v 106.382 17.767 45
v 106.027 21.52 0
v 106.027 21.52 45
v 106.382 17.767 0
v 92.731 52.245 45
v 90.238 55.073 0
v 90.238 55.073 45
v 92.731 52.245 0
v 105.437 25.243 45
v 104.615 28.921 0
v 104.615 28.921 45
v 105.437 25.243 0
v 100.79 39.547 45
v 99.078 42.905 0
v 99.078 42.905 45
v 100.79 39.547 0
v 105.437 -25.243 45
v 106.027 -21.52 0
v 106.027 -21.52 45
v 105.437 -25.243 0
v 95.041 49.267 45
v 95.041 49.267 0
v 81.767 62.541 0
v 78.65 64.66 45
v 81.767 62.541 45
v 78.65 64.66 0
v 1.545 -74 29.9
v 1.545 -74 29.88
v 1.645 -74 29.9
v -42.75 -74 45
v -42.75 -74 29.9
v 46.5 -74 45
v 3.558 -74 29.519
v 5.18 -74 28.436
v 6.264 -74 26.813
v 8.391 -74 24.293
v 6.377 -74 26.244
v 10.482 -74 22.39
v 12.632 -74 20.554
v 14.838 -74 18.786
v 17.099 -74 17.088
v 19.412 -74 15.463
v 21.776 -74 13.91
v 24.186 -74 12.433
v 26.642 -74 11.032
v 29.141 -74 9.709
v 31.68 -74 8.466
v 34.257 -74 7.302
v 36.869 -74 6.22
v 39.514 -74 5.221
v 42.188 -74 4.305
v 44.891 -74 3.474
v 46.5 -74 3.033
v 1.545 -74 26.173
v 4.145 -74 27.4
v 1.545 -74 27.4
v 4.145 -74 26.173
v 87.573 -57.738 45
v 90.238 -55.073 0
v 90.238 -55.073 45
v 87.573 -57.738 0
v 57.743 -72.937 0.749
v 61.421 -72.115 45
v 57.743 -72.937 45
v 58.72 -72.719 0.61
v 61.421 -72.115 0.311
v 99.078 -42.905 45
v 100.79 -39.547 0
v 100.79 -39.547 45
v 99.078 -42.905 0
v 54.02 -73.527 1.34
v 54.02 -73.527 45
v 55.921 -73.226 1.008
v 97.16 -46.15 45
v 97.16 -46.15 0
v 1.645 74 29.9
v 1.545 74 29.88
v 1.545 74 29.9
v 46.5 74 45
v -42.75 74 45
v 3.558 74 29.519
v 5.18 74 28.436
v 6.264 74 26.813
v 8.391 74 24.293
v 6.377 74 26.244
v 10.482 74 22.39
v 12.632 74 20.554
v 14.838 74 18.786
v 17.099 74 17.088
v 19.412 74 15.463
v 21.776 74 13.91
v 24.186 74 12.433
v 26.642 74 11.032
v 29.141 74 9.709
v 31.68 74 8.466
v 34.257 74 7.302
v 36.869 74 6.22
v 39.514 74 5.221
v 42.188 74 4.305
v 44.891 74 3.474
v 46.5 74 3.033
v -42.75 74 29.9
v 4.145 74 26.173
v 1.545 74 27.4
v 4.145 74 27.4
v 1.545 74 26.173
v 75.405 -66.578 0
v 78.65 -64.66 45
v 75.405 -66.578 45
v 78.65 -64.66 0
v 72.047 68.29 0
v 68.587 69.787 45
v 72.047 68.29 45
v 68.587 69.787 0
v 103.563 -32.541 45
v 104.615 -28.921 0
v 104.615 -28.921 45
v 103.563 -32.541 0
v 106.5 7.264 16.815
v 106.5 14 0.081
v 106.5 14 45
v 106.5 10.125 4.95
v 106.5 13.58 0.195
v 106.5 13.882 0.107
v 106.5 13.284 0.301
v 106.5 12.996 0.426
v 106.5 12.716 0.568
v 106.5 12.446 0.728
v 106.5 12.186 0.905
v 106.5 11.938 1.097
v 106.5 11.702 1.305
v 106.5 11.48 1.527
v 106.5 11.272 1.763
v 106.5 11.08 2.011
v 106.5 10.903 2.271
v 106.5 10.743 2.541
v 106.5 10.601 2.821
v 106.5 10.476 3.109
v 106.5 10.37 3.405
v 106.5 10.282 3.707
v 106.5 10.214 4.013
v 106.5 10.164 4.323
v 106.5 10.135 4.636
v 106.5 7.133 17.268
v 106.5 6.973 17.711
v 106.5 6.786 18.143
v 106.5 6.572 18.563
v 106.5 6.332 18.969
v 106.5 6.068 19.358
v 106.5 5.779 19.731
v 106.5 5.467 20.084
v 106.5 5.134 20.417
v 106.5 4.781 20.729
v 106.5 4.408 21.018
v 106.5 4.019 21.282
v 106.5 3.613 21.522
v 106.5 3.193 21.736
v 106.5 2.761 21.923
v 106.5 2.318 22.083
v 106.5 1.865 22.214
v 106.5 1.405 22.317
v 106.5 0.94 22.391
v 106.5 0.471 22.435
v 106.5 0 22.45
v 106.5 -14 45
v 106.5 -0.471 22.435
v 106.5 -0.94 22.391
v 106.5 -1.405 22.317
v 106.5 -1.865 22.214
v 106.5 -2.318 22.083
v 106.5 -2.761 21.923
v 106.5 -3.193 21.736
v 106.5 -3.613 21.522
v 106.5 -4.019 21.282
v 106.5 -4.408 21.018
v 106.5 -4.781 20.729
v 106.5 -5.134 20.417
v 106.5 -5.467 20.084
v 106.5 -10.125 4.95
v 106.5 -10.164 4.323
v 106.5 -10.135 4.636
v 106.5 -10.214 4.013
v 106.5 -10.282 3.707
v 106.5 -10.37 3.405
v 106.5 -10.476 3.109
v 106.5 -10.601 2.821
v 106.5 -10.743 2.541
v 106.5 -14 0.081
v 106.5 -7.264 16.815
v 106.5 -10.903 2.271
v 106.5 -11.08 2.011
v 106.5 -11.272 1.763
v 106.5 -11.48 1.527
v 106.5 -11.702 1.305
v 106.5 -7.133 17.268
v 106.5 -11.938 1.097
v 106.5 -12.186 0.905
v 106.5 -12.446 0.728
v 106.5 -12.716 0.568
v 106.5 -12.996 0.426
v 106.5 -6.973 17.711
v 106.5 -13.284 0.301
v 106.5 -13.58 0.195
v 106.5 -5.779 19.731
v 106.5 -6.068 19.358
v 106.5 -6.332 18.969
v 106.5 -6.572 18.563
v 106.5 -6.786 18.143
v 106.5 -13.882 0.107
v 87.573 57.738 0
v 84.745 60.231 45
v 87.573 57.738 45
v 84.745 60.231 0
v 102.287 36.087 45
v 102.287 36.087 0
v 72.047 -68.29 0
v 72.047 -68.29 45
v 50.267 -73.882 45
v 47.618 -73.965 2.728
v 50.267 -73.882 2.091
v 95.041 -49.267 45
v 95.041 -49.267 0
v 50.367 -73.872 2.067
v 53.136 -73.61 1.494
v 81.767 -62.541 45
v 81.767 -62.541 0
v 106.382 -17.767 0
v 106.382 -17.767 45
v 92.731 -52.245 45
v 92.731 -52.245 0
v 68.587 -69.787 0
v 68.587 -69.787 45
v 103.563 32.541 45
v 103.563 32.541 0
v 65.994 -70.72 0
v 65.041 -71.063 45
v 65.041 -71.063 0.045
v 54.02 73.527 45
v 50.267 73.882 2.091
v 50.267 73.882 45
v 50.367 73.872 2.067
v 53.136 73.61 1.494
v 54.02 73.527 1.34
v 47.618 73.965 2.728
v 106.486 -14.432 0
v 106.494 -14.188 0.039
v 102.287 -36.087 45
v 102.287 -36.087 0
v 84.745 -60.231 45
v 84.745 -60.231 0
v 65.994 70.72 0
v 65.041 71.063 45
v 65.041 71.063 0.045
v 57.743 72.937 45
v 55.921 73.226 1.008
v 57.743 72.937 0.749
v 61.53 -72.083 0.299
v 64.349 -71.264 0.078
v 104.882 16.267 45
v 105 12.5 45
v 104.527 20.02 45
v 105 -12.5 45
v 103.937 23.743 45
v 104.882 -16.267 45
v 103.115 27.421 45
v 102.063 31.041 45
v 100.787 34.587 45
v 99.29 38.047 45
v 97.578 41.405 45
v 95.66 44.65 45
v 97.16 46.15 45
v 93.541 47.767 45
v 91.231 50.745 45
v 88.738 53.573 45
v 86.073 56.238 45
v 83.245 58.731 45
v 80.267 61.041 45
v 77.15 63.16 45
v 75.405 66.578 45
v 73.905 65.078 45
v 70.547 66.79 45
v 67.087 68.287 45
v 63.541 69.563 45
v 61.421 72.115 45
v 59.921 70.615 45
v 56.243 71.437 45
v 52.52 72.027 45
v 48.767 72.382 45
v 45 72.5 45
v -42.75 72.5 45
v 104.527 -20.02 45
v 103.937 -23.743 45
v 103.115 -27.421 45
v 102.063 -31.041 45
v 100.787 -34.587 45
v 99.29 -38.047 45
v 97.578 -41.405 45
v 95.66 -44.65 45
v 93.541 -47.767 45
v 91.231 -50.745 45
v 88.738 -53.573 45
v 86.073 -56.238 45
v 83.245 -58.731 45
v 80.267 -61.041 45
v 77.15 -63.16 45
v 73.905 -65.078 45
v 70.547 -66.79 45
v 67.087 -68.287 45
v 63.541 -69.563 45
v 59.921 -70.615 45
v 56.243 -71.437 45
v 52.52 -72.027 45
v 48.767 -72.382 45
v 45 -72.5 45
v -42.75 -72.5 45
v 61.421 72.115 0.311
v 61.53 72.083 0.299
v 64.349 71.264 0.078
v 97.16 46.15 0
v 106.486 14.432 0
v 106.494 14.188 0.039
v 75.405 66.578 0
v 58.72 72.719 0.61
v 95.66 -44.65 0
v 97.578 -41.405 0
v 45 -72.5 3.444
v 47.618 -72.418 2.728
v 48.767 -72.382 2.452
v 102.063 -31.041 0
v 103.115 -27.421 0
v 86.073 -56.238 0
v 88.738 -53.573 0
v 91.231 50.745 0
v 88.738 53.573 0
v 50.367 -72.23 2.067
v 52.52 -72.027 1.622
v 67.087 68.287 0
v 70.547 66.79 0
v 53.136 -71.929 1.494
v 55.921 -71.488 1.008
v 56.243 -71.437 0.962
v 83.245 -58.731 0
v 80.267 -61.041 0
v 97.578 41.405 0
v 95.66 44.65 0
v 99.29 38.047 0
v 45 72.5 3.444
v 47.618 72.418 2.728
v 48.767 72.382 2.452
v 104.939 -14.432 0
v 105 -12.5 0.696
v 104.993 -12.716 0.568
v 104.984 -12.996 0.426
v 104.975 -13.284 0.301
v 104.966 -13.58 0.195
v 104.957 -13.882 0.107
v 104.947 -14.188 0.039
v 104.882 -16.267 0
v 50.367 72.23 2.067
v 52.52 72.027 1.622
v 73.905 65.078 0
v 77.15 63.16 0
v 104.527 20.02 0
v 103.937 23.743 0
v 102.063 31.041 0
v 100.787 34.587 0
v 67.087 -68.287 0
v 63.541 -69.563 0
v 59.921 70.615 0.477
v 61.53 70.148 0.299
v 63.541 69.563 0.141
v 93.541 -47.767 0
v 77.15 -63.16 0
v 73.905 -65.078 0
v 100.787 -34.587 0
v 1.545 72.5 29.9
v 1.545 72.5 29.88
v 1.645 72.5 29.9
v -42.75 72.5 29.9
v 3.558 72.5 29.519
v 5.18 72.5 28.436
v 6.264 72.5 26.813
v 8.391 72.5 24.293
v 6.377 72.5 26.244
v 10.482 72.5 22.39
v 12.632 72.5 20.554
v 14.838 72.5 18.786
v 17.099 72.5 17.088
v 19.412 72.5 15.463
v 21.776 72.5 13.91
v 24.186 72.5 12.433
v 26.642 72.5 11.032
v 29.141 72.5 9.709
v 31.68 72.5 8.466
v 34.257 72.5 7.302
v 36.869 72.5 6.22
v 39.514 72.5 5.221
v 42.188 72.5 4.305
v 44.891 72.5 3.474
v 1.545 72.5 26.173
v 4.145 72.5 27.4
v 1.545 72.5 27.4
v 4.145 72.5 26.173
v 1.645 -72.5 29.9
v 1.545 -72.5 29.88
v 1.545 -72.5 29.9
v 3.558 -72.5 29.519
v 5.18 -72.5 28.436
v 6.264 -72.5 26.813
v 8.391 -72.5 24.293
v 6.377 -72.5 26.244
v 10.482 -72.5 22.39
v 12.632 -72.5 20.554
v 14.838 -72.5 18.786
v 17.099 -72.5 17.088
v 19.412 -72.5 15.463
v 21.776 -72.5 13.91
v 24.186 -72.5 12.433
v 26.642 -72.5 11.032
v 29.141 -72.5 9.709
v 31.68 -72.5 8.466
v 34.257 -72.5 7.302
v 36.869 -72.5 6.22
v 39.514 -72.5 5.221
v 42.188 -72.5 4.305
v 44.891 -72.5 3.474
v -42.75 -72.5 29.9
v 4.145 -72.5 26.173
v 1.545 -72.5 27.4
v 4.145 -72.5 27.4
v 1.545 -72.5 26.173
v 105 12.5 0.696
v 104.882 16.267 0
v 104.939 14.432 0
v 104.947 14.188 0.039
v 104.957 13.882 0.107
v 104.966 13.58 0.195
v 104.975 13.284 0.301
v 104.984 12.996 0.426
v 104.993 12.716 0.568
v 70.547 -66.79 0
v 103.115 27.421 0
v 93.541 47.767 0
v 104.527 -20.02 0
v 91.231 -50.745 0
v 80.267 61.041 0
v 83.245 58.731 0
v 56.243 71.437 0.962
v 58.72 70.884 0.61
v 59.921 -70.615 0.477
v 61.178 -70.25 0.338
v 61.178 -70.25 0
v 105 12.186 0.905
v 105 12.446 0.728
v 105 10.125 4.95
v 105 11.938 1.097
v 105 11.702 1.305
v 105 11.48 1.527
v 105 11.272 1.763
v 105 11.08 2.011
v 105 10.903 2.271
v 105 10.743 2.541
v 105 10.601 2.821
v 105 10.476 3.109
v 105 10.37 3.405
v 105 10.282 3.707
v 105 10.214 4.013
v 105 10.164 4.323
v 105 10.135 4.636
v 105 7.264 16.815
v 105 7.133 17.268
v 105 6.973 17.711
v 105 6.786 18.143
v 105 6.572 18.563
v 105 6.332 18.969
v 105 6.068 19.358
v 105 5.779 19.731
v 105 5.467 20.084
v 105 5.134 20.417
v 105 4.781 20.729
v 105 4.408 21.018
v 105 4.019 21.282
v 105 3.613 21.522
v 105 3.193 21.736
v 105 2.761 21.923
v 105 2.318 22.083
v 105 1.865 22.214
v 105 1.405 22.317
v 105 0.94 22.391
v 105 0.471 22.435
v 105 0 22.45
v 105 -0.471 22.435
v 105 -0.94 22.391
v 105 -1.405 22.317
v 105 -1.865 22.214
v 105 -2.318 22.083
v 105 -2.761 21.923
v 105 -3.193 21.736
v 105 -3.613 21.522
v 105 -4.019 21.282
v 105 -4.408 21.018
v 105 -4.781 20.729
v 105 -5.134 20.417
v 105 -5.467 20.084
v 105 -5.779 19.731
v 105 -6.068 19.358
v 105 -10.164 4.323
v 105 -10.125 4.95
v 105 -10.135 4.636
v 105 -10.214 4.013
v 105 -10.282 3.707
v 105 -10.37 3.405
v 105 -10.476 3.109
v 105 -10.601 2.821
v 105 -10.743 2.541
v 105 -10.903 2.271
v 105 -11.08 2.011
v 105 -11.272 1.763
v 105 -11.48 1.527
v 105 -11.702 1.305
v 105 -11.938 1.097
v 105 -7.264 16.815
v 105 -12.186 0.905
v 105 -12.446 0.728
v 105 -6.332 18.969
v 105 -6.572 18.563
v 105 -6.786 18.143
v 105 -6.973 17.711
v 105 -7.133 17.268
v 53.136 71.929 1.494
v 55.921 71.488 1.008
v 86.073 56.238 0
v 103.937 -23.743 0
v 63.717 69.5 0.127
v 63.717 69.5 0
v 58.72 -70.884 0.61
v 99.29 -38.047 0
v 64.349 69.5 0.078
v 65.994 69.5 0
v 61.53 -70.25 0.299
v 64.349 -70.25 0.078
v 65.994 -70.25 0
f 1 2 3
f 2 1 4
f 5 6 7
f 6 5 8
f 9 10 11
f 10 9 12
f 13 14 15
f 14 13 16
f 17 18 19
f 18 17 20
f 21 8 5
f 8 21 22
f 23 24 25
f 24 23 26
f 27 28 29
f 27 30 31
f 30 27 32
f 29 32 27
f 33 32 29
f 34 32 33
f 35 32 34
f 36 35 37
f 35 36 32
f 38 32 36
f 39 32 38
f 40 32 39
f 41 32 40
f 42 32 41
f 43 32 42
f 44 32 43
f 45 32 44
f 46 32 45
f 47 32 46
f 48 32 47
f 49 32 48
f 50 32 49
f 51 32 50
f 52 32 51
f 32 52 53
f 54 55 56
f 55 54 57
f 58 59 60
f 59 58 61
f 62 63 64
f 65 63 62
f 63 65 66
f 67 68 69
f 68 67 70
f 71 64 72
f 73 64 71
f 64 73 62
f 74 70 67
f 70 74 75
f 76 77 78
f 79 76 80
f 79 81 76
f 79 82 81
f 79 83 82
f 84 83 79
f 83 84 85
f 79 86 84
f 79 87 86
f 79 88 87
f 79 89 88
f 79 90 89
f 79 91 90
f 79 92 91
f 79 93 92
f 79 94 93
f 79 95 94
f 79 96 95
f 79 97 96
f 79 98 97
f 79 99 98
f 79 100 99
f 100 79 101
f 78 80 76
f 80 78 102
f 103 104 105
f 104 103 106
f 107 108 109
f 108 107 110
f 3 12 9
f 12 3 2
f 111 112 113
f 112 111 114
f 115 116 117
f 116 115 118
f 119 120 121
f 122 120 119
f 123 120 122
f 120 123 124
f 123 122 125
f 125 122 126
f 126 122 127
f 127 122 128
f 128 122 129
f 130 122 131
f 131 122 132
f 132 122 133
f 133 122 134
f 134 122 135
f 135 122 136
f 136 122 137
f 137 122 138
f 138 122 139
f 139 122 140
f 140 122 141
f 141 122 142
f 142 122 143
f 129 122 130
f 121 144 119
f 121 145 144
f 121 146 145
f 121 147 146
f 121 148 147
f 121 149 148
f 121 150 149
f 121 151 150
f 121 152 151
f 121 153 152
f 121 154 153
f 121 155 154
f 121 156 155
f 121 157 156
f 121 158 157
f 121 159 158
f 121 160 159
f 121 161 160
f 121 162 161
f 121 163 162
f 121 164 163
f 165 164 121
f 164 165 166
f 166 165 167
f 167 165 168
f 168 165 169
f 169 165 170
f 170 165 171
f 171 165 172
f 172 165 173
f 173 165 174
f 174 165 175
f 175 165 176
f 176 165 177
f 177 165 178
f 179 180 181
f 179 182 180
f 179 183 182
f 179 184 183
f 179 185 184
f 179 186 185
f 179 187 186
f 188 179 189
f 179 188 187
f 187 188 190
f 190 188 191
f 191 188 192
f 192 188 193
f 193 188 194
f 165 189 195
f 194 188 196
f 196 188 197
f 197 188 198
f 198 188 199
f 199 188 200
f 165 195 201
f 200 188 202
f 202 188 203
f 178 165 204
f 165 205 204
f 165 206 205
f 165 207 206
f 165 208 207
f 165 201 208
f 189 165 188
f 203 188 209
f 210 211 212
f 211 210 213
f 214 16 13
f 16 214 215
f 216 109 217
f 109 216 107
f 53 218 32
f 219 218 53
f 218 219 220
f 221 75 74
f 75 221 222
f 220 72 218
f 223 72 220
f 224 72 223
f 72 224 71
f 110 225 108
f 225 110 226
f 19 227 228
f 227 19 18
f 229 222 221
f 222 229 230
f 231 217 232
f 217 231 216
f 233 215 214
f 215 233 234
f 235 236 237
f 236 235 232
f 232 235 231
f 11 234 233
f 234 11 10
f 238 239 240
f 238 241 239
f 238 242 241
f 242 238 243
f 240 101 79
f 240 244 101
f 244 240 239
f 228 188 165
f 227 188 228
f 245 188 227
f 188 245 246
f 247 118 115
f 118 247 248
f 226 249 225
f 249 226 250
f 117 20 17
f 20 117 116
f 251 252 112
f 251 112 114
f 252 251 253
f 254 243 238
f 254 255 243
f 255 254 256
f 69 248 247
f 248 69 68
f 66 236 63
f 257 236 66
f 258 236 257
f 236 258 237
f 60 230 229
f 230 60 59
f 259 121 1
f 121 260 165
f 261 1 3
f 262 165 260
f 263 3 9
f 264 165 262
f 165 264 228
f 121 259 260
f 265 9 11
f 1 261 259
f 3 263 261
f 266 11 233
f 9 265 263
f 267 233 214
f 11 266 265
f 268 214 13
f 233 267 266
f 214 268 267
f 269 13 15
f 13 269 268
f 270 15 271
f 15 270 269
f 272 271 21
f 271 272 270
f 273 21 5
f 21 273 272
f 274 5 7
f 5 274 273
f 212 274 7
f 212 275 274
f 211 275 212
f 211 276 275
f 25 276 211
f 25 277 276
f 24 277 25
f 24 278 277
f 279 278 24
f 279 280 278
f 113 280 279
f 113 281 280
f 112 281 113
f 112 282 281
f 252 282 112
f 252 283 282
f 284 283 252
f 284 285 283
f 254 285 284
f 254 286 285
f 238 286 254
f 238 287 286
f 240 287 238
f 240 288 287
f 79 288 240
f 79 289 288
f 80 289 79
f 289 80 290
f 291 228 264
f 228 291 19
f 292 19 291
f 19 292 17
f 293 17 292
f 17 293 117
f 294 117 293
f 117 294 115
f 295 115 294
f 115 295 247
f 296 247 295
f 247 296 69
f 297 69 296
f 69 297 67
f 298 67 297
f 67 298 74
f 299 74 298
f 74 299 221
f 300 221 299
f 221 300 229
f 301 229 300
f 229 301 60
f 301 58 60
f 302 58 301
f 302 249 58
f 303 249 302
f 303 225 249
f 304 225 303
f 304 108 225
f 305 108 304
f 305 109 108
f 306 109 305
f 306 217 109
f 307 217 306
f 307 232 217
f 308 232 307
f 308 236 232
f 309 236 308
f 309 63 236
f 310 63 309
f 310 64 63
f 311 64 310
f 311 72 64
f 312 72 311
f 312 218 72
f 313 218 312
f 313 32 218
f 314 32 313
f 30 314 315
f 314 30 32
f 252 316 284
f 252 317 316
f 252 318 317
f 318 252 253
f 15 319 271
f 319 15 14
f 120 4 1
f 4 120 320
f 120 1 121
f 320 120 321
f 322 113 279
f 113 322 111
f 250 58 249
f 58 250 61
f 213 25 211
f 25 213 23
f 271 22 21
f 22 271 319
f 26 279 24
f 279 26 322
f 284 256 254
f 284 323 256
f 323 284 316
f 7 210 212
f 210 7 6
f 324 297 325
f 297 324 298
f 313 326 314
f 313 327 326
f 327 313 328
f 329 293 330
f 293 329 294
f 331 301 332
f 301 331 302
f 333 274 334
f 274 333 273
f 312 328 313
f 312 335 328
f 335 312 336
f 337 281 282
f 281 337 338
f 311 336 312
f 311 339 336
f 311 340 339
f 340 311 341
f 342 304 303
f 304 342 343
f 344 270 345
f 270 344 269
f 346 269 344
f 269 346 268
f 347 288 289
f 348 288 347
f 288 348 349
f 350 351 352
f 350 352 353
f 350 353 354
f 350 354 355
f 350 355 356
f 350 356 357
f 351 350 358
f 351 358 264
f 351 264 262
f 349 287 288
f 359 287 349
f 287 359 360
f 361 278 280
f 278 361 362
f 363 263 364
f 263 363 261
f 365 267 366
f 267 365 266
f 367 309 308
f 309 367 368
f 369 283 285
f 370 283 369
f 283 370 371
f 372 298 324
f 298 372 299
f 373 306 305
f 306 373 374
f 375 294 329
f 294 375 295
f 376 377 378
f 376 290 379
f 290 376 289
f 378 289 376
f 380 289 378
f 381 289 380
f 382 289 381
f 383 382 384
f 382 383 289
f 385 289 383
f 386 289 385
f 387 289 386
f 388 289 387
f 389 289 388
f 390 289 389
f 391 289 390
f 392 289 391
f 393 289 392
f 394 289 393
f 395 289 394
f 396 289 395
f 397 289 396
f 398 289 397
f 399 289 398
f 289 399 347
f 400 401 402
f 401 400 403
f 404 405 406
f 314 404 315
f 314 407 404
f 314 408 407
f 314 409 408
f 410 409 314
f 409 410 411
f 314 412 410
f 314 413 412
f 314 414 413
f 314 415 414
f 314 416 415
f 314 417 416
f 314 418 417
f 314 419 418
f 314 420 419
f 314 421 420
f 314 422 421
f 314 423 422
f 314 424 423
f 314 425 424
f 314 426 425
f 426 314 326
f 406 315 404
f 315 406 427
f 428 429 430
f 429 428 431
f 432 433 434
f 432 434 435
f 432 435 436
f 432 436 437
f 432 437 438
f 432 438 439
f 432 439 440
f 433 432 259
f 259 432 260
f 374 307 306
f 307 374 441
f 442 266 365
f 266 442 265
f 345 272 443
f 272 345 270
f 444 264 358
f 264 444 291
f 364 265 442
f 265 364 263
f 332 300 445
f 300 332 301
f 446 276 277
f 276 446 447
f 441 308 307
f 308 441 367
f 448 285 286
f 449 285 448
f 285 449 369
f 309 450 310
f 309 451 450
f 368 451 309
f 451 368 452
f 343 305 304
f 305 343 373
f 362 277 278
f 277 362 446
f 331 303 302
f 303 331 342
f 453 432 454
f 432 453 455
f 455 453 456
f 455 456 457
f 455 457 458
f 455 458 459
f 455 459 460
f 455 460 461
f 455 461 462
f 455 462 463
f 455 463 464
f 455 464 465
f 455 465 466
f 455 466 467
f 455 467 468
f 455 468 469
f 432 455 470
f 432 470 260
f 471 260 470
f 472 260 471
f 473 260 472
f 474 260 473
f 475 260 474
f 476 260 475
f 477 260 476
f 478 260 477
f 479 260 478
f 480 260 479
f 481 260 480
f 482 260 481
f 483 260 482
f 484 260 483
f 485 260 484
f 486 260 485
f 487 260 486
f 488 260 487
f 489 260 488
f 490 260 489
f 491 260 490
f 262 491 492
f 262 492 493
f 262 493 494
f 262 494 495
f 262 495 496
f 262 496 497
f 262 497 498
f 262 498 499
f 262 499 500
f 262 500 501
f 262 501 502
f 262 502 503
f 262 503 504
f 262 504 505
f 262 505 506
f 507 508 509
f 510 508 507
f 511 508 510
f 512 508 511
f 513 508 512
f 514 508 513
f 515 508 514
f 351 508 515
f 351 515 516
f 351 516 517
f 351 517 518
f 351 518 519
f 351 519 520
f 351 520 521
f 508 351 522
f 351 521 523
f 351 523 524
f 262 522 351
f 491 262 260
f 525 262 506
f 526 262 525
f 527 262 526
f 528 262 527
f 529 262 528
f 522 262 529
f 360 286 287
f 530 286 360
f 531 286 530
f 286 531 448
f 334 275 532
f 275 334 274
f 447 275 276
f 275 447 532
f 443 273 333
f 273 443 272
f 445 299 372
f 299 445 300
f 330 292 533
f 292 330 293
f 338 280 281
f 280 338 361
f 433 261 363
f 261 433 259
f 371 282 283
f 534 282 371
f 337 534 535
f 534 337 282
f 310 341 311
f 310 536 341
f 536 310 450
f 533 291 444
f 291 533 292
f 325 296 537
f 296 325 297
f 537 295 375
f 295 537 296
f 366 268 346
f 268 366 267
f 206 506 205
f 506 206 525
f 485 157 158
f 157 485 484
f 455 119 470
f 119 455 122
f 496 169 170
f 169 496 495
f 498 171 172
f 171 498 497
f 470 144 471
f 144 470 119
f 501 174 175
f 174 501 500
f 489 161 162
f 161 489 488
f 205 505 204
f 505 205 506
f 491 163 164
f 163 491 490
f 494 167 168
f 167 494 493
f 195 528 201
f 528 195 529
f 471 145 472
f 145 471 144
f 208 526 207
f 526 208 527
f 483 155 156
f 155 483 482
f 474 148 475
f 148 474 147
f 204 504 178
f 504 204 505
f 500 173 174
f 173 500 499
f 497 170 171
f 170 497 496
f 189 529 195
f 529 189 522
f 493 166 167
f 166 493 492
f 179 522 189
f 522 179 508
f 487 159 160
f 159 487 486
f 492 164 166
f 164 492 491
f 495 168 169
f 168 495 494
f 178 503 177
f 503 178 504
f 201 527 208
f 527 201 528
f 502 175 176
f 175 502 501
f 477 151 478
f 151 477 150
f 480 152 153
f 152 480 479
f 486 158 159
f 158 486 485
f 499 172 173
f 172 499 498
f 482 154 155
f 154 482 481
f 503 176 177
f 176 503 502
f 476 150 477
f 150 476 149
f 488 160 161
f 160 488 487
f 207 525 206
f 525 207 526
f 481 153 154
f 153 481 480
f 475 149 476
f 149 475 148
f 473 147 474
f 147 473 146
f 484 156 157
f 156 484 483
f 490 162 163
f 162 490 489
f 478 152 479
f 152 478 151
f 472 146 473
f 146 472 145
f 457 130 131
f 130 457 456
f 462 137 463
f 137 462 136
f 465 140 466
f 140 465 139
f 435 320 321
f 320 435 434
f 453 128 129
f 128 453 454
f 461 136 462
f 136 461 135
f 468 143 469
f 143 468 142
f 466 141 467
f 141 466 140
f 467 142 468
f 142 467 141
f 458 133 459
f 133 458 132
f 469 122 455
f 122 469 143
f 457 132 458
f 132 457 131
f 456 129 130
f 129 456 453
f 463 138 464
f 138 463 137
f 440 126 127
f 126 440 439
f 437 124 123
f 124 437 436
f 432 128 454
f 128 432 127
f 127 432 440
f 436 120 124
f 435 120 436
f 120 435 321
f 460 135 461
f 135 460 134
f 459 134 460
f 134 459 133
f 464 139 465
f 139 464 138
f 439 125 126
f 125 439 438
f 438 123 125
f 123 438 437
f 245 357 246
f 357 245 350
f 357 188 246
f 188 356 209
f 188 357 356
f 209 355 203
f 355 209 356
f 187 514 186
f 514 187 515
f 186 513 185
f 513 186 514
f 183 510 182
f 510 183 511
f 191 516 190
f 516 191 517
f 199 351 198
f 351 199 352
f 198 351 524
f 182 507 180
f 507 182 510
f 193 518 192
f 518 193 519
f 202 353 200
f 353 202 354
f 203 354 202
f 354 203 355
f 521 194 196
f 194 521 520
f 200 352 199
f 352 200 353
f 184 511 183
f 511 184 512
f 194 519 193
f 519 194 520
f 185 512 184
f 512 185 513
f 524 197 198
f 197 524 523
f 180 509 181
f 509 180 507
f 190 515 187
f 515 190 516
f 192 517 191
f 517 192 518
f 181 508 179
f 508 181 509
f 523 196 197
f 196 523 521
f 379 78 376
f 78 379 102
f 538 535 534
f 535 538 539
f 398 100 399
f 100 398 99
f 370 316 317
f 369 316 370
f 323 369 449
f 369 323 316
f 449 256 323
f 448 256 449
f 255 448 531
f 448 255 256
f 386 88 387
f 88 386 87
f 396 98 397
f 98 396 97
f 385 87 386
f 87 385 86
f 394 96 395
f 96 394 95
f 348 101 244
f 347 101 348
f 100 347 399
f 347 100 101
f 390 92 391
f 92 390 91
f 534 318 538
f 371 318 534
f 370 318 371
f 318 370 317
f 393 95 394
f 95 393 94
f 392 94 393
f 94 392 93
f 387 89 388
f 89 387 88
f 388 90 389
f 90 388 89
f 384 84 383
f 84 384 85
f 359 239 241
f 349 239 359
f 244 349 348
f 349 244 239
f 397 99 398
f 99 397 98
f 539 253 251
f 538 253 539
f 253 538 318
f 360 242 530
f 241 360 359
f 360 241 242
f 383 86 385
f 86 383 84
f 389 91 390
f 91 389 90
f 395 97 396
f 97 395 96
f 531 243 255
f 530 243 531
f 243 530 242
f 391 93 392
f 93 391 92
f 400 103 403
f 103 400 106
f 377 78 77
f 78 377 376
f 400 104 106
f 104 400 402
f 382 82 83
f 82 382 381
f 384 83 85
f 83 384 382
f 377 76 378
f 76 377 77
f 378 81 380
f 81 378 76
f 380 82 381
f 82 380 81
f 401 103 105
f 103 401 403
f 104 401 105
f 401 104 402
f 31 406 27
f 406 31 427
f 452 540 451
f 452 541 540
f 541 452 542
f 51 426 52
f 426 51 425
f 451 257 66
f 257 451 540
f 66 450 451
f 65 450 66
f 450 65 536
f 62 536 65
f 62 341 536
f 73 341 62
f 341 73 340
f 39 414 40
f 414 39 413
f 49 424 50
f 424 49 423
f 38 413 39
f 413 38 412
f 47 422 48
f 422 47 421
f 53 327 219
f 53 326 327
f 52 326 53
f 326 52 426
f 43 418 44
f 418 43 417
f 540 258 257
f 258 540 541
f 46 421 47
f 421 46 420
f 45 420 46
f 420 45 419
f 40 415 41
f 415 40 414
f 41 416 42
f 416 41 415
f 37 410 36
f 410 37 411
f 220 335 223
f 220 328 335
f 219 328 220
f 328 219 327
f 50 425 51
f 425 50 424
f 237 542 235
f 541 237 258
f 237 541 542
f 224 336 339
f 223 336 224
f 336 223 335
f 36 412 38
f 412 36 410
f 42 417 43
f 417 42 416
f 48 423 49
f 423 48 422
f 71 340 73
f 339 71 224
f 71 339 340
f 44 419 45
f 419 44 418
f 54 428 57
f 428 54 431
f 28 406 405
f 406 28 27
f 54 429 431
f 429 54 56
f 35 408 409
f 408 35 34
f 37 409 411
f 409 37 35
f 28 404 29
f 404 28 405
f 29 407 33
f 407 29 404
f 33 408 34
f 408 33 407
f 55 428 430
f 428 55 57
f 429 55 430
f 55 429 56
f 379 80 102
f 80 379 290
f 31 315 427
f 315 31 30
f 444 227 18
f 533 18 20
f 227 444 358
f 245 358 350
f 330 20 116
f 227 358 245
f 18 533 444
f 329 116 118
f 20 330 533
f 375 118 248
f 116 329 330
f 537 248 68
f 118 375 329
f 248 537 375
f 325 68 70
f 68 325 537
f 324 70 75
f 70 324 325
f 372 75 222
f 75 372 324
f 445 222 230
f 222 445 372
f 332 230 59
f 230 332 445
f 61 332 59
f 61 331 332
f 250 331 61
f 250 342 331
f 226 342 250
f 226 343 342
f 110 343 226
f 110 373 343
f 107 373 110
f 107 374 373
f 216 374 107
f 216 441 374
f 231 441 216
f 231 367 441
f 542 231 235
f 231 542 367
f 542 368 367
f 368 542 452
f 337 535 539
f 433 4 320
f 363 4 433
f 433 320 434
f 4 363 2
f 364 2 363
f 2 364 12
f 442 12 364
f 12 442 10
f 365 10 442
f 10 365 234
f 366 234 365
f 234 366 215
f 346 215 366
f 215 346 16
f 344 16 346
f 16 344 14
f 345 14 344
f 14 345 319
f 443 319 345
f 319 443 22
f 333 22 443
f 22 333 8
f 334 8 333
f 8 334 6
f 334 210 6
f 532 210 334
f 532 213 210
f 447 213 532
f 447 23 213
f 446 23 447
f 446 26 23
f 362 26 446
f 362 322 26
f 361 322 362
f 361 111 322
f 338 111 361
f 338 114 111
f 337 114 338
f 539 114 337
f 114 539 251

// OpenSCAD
rayon_courbure = 60;
longueur = 150 + rayon_courbure;
largeur = 145;
hauteur = 45;
largeur_nez = 15;
hauteur_nez = hauteur/3;
hauteur_branche = hauteur/3;
epaisseur = 1.5;


module rectangle(longueur, largeur, hauteur, rayon){
    minkowski(){
        translate([0,0,hauteur/2])
        cube([longueur-2*rayon, largeur-2*rayon, hauteur-rayon/2], center=true);
        cylinder(r=rayon, h=hauteur, $fn=100);
    }
}

module contour_rectangle(longueur, largeur, hauteur, rayon, epaisseur){
    difference(){
        rectangle(longueur+2*epaisseur, largeur+2*epaisseur, hauteur, rayon);
        translate([0,0,-0.5])
        rectangle(longueur, largeur, hauteur+1, rayon);
    }
}

module branche(){
    rayon = 2*hauteur;
    h = hauteur-hauteur_branche;
    petit_rayon = 5;
    position_arrondi = sqrt(pow(rayon, 2)-pow(rayon-h,2));
    ratio = position_arrondi/rayon;
    echo(ratio);
    difference(){
        cube([2*longueur/3, 4*epaisseur, h], center = true);    
        translate([longueur/3,0,2*hauteur-h/2])
        rotate([90,0,0])
        cylinder(r=rayon, h=4*epaisseur, $fn=200, center=true);
        translate([longueur/3-position_arrondi+ratio*petit_rayon/2-(1-ratio)*petit_rayon-0.1,0,(h-ratio*petit_rayon)/2])
        cube([ratio*petit_rayon, 4*epaisseur, ratio*petit_rayon], center = true);    
    }
    translate([longueur/3-position_arrondi-(1-ratio)*petit_rayon,0,h/2-petit_rayon])
    difference(){
        rotate([90,0,0])
        cylinder(r=petit_rayon, h=4*epaisseur, center=true);
        translate([petit_rayon/2+sqrt(pow(petit_rayon, 2)-pow(petit_rayon-h,2)), 0, 0])
        color("red")
        cube([petit_rayon, 4*epaisseur, petit_rayon], center = true);   
    }
}

module nez(coef){
    petit_rayon = 5;
    difference(){
        union(){
            hull(){
                cylinder(d=largeur_nez, h=hauteur, $fn=100);
                translate([hauteur_nez-petit_rayon/2,0,hauteur/2])
                cube([petit_rayon,coef*largeur_nez,hauteur], center=true);
            }
            translate([hauteur_nez-petit_rayon/2,0,hauteur/2])
                cube([petit_rayon,coef*largeur_nez+2*petit_rayon,hauteur], center=true);
    }
    translate([hauteur_nez-petit_rayon,coef*largeur_nez/2+petit_rayon,0])
    cylinder(r=petit_rayon, h=hauteur, $fn=100);
    translate([hauteur_nez-petit_rayon,-coef*largeur_nez/2-petit_rayon,0])
    cylinder(r=petit_rayon, h=hauteur, $fn=100);
}
}

module lunettes(){
    difference(){
        translate([0,0,-rayon_courbure/2])
        contour_rectangle(longueur, largeur, hauteur, rayon_courbure, epaisseur);
        translate([-(longueur-rayon_courbure)/2,0,hauteur/2])
        cube([rayon_courbure+3*epaisseur, largeur+2*rayon_courbure+1, 2*hauteur], center = true);
        translate([0,0,-hauteur/2])
        cube([longueur+3*epaisseur, largeur+3*epaisseur, hauteur], center = true);
        translate([longueur/2-epaisseur,0,hauteur_nez-0.05])
        rotate([0,90,0])
        nez(1.35);
        translate([0,largeur/2,(hauteur-hauteur_branche)/2-0.1])
        branche();
        translate([0,-(largeur+epaisseur)/2,(hauteur-hauteur_branche)/2-0.1])
        branche();
    }
    
}


lunettes();
